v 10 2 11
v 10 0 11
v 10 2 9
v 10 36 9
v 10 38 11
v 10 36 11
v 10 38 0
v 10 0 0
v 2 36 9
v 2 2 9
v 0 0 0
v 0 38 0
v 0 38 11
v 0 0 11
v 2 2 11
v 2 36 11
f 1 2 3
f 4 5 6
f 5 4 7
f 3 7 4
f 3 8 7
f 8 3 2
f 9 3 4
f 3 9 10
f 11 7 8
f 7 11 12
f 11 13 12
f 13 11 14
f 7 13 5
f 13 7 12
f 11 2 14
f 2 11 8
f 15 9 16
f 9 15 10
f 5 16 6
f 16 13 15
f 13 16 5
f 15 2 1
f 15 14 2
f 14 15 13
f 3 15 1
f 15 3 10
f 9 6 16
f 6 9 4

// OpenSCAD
jig_width = 10;
hinge_length = 34;
frame_lip = 4;
jig_thickness = 9;
raised_edge_height = 2;

total_length = hinge_length + frame_lip;

union() {
  cube([jig_width, total_length, jig_thickness]);
  cube([2, total_length, jig_thickness + raised_edge_height]);
  cube([jig_width, 2, jig_thickness + raised_edge_height]);
  translate([0, total_length - 2, 0])
    cube([jig_width, 2, jig_thickness + raised_edge_height]);
}
